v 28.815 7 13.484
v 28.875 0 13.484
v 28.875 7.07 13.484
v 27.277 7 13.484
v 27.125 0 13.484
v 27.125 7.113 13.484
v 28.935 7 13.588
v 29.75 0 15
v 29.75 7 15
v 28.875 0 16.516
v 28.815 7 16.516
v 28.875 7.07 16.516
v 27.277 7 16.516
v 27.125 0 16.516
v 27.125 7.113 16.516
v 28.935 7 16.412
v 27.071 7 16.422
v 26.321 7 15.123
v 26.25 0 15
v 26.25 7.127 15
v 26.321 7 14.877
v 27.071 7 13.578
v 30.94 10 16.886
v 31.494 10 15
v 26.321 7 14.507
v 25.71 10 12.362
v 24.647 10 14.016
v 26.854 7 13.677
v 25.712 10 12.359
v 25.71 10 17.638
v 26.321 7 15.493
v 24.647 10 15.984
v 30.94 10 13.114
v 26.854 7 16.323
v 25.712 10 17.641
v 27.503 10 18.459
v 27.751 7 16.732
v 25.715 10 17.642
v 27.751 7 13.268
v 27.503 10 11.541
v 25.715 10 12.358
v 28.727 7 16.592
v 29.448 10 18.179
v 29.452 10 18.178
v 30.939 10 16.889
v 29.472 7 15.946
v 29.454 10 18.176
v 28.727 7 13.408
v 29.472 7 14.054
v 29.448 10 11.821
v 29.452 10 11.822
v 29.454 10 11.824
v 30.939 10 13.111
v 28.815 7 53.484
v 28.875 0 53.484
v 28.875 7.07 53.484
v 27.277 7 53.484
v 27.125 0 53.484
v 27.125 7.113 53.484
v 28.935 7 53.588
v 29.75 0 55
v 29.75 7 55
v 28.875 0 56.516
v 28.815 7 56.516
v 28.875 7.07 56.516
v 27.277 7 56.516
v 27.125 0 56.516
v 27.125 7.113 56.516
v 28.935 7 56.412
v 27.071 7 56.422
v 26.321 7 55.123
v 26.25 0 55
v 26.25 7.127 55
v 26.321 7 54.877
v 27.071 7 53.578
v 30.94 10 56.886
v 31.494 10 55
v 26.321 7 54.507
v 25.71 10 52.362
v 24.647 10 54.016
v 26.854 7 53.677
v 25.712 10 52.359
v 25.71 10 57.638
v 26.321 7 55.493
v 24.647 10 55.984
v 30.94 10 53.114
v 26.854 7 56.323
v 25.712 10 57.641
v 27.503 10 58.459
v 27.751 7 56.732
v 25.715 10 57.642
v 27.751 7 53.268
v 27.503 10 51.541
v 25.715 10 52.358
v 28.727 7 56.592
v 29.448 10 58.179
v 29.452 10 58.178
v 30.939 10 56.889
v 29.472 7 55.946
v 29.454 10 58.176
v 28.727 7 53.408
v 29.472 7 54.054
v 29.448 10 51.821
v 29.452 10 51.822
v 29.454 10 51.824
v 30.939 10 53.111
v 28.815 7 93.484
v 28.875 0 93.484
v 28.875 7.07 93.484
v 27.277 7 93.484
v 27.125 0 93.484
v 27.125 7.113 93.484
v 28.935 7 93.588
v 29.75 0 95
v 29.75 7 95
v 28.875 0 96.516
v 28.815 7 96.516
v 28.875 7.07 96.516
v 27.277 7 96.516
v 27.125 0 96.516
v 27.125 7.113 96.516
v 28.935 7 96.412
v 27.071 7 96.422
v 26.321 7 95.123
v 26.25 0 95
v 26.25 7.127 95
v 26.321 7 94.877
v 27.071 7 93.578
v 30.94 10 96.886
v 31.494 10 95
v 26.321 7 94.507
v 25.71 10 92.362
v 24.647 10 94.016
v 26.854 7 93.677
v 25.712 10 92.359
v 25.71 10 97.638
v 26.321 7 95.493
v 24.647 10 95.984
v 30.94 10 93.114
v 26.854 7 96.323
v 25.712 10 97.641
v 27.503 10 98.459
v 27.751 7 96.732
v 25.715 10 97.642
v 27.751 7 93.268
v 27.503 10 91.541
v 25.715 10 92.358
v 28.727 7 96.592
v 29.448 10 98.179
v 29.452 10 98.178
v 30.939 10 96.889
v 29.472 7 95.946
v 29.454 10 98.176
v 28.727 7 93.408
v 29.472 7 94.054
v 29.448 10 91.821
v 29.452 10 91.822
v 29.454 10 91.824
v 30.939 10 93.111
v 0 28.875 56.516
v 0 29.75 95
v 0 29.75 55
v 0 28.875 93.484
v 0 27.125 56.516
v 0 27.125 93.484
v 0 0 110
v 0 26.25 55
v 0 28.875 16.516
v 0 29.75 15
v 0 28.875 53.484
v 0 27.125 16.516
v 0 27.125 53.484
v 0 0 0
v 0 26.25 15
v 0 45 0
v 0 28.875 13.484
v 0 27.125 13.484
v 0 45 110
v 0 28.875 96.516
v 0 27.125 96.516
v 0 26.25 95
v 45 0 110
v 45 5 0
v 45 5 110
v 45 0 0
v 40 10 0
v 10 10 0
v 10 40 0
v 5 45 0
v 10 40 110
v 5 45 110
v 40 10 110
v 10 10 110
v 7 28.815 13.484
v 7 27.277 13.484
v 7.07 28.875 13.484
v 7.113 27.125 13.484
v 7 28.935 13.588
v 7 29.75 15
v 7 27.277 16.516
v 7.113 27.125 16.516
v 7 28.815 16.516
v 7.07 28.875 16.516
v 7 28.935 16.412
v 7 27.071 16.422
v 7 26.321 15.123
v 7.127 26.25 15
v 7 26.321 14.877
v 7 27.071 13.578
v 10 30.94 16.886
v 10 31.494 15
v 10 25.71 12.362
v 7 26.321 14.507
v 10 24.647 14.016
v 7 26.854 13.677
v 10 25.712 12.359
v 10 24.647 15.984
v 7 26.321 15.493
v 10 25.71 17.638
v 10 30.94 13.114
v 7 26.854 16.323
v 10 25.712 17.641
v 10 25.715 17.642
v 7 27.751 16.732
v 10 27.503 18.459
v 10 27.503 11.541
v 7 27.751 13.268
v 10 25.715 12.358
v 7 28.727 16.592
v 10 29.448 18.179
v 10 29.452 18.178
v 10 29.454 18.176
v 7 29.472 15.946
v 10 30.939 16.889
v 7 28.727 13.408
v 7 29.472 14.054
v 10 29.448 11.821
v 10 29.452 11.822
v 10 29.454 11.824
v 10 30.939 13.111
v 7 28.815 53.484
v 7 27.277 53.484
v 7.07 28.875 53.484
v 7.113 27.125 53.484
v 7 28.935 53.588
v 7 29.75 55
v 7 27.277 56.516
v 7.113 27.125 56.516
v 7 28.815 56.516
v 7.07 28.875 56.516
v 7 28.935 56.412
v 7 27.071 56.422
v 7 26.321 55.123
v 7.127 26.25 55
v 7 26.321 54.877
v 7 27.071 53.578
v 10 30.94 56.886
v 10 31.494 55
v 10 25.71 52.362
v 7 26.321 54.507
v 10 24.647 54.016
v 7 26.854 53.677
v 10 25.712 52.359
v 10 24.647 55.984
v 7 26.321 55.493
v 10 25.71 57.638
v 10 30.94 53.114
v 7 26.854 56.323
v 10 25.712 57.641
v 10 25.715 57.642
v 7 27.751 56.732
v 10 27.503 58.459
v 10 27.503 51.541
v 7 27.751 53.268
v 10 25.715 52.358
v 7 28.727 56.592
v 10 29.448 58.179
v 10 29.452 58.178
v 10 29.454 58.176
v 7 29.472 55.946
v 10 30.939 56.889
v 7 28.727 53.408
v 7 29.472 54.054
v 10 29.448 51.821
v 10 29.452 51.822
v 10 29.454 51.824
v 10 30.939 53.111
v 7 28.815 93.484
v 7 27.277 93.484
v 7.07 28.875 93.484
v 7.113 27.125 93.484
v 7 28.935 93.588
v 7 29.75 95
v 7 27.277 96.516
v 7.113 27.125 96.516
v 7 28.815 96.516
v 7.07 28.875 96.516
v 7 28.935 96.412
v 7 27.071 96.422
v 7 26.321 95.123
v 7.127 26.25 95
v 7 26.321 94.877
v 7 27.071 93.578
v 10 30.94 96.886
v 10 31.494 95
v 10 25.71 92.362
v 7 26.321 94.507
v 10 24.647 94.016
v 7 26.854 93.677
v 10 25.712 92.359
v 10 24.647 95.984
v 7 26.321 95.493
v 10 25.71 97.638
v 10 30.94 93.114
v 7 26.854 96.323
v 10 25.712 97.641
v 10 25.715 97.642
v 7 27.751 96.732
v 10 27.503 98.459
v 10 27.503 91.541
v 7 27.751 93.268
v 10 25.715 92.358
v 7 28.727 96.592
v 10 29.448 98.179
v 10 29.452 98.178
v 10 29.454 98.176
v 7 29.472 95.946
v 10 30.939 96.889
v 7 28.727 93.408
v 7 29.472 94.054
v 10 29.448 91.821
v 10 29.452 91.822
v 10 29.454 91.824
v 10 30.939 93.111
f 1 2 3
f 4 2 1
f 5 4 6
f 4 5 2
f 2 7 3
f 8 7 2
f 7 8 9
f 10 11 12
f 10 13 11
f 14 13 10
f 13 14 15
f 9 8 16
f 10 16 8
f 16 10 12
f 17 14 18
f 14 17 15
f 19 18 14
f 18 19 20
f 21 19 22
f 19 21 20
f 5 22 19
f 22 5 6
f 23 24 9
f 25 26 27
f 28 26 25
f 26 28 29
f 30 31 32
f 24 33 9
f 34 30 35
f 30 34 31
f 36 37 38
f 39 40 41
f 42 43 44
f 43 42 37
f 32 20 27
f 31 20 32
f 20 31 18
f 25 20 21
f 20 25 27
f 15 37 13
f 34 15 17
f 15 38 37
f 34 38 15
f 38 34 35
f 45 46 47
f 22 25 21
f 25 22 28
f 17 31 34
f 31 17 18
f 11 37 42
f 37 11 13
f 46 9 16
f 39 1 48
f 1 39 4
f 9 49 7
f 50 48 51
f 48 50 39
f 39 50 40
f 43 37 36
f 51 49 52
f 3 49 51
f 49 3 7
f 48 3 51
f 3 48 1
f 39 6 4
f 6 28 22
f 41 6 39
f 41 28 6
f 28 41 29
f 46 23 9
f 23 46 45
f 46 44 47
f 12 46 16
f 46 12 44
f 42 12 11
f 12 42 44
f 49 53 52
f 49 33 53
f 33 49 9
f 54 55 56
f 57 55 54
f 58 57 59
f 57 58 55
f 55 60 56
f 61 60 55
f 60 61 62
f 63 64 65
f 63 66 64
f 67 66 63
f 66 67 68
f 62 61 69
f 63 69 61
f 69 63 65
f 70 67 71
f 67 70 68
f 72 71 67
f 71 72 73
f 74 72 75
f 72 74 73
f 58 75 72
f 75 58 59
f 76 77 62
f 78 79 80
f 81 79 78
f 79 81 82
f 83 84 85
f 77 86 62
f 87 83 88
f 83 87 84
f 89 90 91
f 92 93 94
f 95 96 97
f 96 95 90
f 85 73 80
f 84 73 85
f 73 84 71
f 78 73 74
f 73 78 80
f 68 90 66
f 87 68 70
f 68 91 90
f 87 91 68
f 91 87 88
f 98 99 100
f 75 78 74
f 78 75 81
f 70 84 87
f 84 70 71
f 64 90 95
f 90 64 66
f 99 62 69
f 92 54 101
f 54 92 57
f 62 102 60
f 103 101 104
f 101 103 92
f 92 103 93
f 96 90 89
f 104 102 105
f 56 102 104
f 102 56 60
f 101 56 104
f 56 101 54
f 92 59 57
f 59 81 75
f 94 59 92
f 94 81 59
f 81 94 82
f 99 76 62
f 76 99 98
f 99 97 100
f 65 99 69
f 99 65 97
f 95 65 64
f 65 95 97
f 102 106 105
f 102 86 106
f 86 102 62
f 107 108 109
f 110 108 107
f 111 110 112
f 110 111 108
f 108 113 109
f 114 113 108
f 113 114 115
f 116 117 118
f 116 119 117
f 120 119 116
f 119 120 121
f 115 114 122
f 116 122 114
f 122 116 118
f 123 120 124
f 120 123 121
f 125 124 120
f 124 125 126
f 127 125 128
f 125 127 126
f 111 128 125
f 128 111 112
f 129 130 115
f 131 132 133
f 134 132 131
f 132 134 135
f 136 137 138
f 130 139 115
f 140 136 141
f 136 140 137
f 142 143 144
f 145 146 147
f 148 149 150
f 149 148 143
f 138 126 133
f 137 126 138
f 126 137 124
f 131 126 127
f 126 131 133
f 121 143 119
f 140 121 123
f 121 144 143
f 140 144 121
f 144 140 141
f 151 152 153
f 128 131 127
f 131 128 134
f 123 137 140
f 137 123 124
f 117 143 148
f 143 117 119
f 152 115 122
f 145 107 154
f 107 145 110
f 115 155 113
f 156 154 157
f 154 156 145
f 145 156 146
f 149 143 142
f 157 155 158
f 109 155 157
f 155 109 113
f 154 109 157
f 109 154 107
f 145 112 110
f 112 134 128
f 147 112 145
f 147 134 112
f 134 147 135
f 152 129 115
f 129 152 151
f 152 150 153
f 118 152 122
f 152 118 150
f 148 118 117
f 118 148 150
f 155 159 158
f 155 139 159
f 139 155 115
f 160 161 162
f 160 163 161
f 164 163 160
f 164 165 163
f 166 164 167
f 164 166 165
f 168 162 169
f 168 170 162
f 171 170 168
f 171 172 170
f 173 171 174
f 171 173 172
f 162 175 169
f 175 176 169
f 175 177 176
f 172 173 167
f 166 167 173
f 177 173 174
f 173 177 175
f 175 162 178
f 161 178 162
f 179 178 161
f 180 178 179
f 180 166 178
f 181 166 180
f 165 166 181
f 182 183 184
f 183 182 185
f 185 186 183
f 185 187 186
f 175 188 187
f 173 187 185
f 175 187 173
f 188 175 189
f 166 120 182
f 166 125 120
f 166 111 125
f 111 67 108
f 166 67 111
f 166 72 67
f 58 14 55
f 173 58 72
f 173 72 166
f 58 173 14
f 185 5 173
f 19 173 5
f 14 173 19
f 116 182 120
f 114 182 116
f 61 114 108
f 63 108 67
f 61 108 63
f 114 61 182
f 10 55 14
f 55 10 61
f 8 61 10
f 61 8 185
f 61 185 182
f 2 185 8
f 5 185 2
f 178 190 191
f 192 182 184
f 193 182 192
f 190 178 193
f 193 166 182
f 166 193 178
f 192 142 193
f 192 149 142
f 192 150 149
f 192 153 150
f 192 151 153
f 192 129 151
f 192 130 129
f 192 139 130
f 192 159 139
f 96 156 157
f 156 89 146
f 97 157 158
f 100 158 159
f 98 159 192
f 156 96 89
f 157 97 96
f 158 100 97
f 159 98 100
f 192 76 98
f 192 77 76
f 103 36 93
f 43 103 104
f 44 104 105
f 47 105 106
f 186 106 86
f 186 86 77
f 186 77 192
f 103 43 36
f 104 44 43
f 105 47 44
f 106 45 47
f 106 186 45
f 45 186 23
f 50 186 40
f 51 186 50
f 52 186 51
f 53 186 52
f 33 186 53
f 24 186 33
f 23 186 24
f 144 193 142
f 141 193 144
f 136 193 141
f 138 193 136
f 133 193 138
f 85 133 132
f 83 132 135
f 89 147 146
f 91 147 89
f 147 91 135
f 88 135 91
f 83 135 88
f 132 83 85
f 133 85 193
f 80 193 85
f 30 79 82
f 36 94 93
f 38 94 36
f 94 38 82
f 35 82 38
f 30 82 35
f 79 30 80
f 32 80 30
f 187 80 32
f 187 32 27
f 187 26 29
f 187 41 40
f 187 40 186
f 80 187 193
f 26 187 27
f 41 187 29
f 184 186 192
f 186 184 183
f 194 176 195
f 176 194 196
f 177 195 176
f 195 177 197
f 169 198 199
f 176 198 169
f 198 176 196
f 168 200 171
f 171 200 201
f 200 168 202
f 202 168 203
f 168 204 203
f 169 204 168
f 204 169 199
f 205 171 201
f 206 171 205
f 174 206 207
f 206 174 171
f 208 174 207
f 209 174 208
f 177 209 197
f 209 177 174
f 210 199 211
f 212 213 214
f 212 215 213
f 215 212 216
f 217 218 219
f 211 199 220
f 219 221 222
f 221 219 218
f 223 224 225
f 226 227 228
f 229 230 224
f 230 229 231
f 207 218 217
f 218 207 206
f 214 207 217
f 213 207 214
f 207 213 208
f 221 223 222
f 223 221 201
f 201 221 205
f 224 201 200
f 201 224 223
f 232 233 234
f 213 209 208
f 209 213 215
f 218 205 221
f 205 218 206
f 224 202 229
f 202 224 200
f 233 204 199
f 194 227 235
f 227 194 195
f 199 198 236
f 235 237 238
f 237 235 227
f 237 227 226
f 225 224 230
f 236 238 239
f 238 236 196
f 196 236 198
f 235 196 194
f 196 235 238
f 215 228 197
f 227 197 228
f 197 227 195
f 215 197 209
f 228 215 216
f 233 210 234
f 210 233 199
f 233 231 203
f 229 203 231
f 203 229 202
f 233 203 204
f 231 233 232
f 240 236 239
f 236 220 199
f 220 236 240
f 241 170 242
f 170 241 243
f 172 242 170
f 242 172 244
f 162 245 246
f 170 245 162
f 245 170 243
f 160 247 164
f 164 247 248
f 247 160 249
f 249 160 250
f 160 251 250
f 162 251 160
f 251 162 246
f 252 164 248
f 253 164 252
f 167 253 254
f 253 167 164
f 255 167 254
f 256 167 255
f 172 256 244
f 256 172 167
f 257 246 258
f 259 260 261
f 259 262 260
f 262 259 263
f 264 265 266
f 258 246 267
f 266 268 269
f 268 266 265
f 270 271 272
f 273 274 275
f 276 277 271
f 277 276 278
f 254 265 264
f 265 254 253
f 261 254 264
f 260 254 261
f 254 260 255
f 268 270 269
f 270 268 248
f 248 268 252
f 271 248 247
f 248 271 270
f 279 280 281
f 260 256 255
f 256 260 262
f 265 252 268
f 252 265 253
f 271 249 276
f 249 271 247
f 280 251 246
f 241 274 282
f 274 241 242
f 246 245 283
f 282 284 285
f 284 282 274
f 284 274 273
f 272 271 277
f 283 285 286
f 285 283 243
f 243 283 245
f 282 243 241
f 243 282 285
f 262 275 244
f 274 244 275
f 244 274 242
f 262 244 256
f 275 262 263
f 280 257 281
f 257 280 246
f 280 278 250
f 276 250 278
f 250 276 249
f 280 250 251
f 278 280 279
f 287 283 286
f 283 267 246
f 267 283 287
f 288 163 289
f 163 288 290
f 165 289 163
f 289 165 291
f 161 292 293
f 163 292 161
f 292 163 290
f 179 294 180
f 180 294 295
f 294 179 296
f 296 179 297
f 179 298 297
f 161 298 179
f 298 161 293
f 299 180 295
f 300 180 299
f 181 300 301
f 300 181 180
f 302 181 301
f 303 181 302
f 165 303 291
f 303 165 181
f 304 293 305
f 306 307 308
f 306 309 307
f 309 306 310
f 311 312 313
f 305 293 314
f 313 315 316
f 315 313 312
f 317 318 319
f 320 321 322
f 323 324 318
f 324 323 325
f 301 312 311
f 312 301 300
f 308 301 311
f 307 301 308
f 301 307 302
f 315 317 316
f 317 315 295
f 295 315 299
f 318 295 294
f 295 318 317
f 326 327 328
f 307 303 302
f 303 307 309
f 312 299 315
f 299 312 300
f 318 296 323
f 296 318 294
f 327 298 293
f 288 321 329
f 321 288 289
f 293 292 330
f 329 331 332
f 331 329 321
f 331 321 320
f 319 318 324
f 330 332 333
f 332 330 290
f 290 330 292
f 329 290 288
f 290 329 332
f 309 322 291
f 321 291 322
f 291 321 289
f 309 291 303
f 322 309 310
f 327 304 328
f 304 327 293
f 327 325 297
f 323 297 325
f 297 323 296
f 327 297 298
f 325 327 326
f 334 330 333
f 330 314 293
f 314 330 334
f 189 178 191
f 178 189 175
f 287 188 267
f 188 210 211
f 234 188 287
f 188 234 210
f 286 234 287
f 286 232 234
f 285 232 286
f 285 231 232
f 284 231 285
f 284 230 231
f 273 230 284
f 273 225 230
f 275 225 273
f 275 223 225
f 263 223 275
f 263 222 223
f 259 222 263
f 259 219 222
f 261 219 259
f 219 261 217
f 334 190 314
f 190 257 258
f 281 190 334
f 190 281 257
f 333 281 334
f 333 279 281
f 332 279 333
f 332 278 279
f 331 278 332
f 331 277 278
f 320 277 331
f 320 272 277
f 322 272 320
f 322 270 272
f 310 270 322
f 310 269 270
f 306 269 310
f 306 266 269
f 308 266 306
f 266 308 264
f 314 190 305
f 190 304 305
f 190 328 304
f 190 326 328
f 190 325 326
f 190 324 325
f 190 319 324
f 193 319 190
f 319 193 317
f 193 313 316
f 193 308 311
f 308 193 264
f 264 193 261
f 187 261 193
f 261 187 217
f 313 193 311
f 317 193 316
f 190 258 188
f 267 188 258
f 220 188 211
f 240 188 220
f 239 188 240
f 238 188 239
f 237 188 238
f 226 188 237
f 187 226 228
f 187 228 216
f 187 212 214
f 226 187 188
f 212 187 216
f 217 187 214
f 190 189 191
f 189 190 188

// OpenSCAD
// Customization variables
width = 45;
height = 110;
thickness = 10;
chamfer_size = 5;
screw_diameter = 3.5;
head_diameter = 7;
head_depth = 3;
screw_holes_number = 3;
screw_edge_distance = 15;
screw_hole_offset_percent = 60;

//TODO, build all the modules inside of the main one

module chamfered_rectangle_2D(width, height, chamfer_size)
{
    assert(chamfer_size <= min(width, height), "Chamfer size must not exceed the smaller dimension");
    
    points = 
    [
        [0, 0],                    // bottom-left
        [width, 0],                // bottom-right
        [width, height - chamfer_size], // top-right (chamfered bottom)
        [width - chamfer_size, height], // top-right (chamfered top)
        [0, height]                // top-left
    ];
    
    // Create the polygon
    polygon(points = points);
}

module chamfered_rectangle_3D(width, height, thickness, chamfer_size)
{
    linear_extrude(height = height)
    {
        chamfered_rectangle_2D(width = width, height = thickness, chamfer_size = chamfer_size);
    }
}

module countersunk_hole()
{
    // Main screw hole
    cylinder(h=thickness + 0.02, d=screw_diameter, center=false);
    
    // Countersunk head
    translate([0, 0, -0.01])
        cylinder(h=head_depth + 0.01, d1=head_diameter, d2=screw_diameter, center=false);
}

module corner()
{
    module half_corner()
    {
        difference()
        {
            chamfered_rectangle_3D(width=width, height=height, thickness=thickness, chamfer_size=chamfer_size);
            
            // Screw holes
            for(i = [0 : screw_holes_number - 1])
            {
                z = screw_edge_distance + (i * (height - 2 * screw_edge_distance) / (screw_holes_number - 1));
                x_offset = thickness + (screw_hole_offset_percent / 100) * (width - chamfer_size - thickness);
                translate([x_offset, thickness, z])
                    rotate([90, 0, 0])
                        countersunk_hole();
            }
        }
    }

    // First half corner
    half_corner();
    
    // Second half corner mirrored by x and rotated -90 degrees
    rotate([0, 0, -90])
        mirror([1, 0, 0])
            half_corner();
}

// Examples

// Example of individual chamfered rectangle
// chamfered_rectangle_3D(width=45, height=110, thickness=10, chamfer_size=5);

// Example of corner module with screw holes
corner();
